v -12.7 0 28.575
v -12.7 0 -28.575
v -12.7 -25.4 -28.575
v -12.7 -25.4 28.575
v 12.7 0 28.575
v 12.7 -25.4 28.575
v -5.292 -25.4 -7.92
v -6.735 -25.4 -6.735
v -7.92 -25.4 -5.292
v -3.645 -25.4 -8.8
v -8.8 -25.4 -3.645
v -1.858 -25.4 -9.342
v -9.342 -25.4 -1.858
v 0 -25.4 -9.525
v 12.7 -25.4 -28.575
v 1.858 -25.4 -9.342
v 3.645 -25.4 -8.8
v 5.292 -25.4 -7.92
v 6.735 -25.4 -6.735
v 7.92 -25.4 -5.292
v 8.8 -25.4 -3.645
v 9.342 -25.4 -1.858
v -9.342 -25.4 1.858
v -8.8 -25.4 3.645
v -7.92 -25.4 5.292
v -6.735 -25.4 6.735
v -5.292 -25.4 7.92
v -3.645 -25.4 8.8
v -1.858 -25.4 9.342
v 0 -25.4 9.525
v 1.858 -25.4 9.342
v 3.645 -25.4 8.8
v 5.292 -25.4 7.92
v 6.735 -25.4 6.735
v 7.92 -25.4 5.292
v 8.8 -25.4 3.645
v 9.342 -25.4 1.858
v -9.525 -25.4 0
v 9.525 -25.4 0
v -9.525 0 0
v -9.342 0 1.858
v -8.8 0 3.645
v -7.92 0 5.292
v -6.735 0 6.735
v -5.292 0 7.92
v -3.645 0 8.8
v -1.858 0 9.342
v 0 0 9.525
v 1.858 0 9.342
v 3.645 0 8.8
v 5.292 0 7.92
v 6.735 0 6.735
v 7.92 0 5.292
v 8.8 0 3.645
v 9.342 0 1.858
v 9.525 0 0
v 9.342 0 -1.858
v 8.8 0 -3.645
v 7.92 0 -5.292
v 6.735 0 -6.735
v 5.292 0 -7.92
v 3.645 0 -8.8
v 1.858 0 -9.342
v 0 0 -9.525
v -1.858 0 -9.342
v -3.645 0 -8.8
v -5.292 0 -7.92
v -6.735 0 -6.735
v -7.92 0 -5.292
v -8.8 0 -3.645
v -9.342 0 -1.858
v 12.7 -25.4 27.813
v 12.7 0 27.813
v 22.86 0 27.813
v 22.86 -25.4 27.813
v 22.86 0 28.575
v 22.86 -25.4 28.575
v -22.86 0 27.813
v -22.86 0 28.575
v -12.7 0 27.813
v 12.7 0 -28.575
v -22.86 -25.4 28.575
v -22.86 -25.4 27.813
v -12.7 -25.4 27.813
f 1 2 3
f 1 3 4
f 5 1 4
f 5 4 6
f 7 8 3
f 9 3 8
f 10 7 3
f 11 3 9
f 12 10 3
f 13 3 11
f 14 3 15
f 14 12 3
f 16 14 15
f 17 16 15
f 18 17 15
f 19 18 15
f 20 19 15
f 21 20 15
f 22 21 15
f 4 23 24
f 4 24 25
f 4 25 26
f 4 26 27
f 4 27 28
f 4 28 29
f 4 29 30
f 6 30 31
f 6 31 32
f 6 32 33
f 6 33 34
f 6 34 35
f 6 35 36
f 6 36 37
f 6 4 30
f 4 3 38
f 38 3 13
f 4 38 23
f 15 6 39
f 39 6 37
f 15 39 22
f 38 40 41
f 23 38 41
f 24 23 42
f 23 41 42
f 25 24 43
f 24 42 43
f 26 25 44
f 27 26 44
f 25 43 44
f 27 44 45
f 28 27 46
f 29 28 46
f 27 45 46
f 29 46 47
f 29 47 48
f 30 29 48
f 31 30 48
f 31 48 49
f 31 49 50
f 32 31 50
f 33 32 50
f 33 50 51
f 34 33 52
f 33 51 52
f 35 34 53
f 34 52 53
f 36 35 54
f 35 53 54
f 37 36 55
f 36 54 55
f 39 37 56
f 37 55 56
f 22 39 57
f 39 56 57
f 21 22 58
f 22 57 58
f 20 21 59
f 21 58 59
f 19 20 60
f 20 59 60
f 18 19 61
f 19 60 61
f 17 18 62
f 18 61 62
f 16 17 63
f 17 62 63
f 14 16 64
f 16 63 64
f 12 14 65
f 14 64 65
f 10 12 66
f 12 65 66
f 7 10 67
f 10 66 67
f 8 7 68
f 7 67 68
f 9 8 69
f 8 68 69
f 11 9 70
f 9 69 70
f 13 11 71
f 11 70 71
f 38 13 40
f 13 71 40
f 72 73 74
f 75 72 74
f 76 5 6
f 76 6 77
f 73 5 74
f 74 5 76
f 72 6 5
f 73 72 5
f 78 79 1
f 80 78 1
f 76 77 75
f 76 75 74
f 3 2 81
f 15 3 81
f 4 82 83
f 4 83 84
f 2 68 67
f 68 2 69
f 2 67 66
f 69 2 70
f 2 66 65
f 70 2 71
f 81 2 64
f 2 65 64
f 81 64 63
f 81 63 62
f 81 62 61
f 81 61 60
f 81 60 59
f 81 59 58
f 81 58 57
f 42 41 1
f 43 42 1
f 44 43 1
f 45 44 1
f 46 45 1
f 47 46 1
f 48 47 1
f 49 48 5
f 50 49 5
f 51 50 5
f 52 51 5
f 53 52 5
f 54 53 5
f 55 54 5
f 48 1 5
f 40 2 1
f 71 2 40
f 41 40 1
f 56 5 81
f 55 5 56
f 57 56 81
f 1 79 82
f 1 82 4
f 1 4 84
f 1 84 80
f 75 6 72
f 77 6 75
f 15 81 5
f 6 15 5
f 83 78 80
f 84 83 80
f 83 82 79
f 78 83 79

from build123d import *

# Parameters (mm, degrees)
F0_W     = 25.4
F0_H     = 57.15
F1_DEPTH = 25.4
F2_W     = 10.16
F2_H     = 25.4
F3_DEPTH = 0.762
F4_R     = 9.525
F5_DEPTH = 25.4


with BuildPart() as f1:
    # F0 (on Front) → F1 (new body)
    with BuildSketch(Plane.XZ):
        Rectangle(F0_W, F0_H)
    extrude(amount=F1_DEPTH)

    # F4 (on face) → F5 (cut)
    with BuildSketch(Plane(origin=(0, 0, 0), x_dir=(-1, 0, 0), z_dir=(0, 1, 0))):
        Circle(F4_R)
    extrude(amount=-F5_DEPTH, mode=Mode.SUBTRACT)


with BuildPart() as f3:
    # F2 (on face) → F3 (new body)
    with BuildSketch(Plane.XY.offset(28.575)):
        with Locations((-17.78, -12.7)):
            Rectangle(F2_W, F2_H)
        with Locations((17.78, -12.7)):
            Rectangle(F2_W, F2_H)
    extrude(amount=-F3_DEPTH)


solid = Compound([f1.part, f3.part])
